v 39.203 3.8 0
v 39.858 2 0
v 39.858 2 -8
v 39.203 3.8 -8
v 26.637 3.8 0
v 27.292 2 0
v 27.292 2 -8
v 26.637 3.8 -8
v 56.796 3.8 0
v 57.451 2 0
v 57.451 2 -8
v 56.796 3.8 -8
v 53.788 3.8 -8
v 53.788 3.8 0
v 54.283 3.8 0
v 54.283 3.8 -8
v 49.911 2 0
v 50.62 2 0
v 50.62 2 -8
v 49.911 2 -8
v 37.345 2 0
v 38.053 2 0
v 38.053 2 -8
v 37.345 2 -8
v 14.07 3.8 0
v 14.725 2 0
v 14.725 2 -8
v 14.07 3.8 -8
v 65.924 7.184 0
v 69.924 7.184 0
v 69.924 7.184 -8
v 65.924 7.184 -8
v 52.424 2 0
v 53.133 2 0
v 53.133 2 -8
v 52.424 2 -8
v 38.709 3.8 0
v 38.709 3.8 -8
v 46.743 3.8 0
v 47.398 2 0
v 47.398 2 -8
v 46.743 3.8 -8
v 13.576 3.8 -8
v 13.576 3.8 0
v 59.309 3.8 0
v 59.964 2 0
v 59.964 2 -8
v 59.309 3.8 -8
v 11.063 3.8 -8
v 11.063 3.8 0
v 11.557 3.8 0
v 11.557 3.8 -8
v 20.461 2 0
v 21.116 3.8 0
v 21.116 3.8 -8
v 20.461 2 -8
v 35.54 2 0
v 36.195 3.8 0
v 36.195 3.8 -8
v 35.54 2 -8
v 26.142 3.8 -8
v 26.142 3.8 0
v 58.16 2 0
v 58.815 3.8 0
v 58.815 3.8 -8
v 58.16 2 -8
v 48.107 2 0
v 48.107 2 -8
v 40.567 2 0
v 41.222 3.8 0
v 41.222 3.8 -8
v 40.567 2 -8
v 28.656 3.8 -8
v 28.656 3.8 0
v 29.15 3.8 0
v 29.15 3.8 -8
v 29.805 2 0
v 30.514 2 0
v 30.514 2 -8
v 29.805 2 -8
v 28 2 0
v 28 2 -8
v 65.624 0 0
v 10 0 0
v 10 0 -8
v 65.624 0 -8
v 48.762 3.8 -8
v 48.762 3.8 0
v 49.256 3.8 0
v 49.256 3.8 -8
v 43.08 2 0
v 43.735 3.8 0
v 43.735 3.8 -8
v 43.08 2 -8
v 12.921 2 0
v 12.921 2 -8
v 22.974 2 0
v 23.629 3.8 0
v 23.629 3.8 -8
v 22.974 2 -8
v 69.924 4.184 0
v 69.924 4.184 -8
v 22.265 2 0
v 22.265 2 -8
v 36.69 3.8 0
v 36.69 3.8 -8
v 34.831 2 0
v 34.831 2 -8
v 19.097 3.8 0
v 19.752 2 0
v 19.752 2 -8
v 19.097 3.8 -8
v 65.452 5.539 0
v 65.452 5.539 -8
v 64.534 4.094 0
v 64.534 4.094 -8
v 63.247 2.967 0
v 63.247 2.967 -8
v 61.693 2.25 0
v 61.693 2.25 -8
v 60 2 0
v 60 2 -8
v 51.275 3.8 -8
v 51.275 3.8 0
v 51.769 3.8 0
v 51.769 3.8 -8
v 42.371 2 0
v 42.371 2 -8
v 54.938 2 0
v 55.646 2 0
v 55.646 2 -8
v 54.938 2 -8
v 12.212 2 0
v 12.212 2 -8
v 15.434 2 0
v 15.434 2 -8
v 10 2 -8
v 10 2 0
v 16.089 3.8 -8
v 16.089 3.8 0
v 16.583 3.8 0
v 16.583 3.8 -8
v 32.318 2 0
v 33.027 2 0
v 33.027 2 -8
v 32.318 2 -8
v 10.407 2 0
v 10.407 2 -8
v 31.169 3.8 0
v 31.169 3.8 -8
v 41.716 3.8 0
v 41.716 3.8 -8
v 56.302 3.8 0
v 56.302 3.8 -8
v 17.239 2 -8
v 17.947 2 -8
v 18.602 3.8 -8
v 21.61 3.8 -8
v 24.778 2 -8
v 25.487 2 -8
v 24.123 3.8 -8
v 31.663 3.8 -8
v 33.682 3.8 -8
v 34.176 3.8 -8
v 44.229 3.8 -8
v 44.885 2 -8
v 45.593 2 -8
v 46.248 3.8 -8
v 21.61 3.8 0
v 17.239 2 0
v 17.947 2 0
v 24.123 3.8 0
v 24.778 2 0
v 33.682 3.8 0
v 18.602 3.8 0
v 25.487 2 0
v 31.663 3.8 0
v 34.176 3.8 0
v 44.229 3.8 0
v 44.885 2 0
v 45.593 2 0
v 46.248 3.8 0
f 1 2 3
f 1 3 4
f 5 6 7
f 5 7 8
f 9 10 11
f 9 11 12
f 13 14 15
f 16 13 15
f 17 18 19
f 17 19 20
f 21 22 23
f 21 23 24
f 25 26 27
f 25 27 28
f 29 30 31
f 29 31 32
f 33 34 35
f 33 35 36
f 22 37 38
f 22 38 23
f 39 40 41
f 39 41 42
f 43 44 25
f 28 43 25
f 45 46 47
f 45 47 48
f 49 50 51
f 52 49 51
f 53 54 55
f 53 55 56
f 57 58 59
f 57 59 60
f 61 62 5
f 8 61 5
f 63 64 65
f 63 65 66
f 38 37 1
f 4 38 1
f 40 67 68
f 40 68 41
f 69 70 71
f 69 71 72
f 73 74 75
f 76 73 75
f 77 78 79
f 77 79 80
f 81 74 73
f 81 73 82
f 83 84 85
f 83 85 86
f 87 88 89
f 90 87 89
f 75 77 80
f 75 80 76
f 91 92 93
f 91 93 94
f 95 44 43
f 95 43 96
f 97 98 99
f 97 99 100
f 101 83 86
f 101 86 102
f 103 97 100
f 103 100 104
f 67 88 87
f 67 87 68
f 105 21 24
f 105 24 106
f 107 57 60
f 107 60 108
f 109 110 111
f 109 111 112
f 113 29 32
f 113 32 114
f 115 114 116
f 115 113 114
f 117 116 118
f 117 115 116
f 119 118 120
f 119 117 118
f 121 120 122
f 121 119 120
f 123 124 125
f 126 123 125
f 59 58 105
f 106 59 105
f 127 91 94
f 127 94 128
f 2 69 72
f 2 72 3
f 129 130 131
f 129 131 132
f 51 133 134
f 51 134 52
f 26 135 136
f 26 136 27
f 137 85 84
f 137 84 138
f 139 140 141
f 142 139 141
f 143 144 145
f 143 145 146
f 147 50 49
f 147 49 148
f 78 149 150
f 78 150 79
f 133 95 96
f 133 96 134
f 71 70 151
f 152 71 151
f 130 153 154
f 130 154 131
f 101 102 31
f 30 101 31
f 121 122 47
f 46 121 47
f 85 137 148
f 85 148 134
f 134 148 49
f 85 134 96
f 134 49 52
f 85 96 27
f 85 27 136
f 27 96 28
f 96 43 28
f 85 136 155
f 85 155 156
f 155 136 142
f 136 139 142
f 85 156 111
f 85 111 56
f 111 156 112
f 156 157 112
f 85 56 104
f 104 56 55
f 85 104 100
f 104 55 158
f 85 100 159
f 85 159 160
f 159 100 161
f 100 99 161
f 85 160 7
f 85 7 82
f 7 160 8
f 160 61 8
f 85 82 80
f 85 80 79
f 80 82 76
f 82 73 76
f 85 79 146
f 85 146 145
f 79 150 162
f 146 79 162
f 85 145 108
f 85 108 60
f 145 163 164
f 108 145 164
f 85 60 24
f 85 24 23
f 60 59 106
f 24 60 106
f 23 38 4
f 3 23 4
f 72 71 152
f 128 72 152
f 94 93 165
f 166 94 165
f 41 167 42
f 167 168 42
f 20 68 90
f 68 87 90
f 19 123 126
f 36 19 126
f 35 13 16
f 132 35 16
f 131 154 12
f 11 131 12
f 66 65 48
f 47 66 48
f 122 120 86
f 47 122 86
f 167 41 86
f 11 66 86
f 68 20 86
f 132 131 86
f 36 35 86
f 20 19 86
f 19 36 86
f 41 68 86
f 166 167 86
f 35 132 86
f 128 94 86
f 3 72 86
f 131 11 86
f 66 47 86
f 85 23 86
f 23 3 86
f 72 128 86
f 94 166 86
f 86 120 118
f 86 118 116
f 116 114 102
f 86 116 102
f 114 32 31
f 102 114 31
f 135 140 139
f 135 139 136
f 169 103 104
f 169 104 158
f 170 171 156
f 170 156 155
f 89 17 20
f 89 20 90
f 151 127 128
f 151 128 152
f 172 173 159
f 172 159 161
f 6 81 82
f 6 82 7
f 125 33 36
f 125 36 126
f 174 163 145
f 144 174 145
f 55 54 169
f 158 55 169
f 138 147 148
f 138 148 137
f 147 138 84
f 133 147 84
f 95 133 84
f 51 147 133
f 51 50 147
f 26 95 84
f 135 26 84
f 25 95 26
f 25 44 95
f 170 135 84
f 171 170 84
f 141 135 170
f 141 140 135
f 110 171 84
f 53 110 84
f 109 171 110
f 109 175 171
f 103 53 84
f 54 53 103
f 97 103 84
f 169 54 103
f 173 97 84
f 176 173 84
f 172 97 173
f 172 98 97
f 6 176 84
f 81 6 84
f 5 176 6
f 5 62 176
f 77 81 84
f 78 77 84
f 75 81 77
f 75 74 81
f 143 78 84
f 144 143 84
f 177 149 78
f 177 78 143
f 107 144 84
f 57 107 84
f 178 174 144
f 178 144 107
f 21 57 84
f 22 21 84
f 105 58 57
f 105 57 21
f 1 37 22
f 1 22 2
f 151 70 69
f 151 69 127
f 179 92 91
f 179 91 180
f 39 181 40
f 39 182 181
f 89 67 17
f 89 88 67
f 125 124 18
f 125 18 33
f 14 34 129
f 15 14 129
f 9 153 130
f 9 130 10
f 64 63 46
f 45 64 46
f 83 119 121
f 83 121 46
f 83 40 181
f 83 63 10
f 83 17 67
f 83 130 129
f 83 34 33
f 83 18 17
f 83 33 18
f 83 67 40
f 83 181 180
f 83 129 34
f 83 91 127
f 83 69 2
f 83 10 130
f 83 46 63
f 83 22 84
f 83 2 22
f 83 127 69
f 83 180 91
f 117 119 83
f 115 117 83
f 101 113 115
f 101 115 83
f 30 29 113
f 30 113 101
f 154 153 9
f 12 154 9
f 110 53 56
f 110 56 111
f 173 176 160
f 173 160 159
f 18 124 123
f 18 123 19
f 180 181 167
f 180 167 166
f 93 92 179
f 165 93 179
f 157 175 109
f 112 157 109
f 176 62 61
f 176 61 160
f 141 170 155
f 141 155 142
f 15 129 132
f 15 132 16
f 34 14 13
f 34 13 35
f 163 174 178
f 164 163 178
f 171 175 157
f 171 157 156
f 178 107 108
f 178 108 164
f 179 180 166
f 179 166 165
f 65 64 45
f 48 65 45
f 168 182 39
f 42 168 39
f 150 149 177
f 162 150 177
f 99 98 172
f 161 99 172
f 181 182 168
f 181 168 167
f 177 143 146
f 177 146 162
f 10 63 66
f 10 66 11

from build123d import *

# Parameters (mm, degrees)
BLANKSKE_W          = 60
BLANKSKE_H          = 3.8
BLANK_DEPTH         = 8
TOOTHCUTSIM_DEPTH   = 61.65014427
TEETHCUTS_COUNT     = 25
TEETHCUTS_PITCH     = 2.51327412
EXTRUDE_1_DEPTH     = 8
SKETCH_2_W          = 10
SKETCH_2_H          = 6.666959913
CUT_EXTRUDE_1_DEPTH = 8


with BuildPart() as part:
    # BlankSke → Blank (new body)
    with BuildSketch(Plane.XY):
        with Locations((30, 1.9)):
            Rectangle(BLANKSKE_W, BLANKSKE_H)
    extrude(amount=-BLANK_DEPTH)

    # TooCutSkeSim → ToothCutSim (cut, through all)
    with BuildSketch(Plane.XY):
        Polygon((0.354348296, 2), (-0.354348296, 2), (-1.018739561, 3.8254), (1.018739561, 3.8254), align=None)
    toothcutsim = extrude(amount=-TOOTHCUTSIM_DEPTH, mode=Mode.SUBTRACT)

    # TeethCuts: ToothCutSim ×25
    with Locations(*[(i * TEETHCUTS_PITCH, 0, 0) for i in range(1, TEETHCUTS_COUNT)]):
        add(toothcutsim, mode=Mode.SUBTRACT)

    # 草图1 → 凸台-拉伸1 (add)
    with BuildSketch(Plane.XY):
        with BuildLine():
            Line((60, 0), (65.623907225, 0))
            Line((65.623907225, 0), (69.923907225, 4.183835629))
            Line((69.923907225, 4.183835629), (69.923907225, 7.183835629))
            Line((69.923907225, 7.183835629), (65.923907225, 7.183835629))
            ThreePointArc((65.923907225, 7.183835629), (63.930879619, 3.484662843), (60, 2))
            Line((60, 2), (60, 0))
        make_face()
    extrude(amount=-EXTRUDE_1_DEPTH)

    # 草图2 → 切除-拉伸1 (cut)
    with BuildSketch(Plane.XY):
        with Locations((5, 3.333479957)):
            Rectangle(SKETCH_2_W, SKETCH_2_H)
    extrude(amount=-CUT_EXTRUDE_1_DEPTH, mode=Mode.SUBTRACT)


solid = part.part
